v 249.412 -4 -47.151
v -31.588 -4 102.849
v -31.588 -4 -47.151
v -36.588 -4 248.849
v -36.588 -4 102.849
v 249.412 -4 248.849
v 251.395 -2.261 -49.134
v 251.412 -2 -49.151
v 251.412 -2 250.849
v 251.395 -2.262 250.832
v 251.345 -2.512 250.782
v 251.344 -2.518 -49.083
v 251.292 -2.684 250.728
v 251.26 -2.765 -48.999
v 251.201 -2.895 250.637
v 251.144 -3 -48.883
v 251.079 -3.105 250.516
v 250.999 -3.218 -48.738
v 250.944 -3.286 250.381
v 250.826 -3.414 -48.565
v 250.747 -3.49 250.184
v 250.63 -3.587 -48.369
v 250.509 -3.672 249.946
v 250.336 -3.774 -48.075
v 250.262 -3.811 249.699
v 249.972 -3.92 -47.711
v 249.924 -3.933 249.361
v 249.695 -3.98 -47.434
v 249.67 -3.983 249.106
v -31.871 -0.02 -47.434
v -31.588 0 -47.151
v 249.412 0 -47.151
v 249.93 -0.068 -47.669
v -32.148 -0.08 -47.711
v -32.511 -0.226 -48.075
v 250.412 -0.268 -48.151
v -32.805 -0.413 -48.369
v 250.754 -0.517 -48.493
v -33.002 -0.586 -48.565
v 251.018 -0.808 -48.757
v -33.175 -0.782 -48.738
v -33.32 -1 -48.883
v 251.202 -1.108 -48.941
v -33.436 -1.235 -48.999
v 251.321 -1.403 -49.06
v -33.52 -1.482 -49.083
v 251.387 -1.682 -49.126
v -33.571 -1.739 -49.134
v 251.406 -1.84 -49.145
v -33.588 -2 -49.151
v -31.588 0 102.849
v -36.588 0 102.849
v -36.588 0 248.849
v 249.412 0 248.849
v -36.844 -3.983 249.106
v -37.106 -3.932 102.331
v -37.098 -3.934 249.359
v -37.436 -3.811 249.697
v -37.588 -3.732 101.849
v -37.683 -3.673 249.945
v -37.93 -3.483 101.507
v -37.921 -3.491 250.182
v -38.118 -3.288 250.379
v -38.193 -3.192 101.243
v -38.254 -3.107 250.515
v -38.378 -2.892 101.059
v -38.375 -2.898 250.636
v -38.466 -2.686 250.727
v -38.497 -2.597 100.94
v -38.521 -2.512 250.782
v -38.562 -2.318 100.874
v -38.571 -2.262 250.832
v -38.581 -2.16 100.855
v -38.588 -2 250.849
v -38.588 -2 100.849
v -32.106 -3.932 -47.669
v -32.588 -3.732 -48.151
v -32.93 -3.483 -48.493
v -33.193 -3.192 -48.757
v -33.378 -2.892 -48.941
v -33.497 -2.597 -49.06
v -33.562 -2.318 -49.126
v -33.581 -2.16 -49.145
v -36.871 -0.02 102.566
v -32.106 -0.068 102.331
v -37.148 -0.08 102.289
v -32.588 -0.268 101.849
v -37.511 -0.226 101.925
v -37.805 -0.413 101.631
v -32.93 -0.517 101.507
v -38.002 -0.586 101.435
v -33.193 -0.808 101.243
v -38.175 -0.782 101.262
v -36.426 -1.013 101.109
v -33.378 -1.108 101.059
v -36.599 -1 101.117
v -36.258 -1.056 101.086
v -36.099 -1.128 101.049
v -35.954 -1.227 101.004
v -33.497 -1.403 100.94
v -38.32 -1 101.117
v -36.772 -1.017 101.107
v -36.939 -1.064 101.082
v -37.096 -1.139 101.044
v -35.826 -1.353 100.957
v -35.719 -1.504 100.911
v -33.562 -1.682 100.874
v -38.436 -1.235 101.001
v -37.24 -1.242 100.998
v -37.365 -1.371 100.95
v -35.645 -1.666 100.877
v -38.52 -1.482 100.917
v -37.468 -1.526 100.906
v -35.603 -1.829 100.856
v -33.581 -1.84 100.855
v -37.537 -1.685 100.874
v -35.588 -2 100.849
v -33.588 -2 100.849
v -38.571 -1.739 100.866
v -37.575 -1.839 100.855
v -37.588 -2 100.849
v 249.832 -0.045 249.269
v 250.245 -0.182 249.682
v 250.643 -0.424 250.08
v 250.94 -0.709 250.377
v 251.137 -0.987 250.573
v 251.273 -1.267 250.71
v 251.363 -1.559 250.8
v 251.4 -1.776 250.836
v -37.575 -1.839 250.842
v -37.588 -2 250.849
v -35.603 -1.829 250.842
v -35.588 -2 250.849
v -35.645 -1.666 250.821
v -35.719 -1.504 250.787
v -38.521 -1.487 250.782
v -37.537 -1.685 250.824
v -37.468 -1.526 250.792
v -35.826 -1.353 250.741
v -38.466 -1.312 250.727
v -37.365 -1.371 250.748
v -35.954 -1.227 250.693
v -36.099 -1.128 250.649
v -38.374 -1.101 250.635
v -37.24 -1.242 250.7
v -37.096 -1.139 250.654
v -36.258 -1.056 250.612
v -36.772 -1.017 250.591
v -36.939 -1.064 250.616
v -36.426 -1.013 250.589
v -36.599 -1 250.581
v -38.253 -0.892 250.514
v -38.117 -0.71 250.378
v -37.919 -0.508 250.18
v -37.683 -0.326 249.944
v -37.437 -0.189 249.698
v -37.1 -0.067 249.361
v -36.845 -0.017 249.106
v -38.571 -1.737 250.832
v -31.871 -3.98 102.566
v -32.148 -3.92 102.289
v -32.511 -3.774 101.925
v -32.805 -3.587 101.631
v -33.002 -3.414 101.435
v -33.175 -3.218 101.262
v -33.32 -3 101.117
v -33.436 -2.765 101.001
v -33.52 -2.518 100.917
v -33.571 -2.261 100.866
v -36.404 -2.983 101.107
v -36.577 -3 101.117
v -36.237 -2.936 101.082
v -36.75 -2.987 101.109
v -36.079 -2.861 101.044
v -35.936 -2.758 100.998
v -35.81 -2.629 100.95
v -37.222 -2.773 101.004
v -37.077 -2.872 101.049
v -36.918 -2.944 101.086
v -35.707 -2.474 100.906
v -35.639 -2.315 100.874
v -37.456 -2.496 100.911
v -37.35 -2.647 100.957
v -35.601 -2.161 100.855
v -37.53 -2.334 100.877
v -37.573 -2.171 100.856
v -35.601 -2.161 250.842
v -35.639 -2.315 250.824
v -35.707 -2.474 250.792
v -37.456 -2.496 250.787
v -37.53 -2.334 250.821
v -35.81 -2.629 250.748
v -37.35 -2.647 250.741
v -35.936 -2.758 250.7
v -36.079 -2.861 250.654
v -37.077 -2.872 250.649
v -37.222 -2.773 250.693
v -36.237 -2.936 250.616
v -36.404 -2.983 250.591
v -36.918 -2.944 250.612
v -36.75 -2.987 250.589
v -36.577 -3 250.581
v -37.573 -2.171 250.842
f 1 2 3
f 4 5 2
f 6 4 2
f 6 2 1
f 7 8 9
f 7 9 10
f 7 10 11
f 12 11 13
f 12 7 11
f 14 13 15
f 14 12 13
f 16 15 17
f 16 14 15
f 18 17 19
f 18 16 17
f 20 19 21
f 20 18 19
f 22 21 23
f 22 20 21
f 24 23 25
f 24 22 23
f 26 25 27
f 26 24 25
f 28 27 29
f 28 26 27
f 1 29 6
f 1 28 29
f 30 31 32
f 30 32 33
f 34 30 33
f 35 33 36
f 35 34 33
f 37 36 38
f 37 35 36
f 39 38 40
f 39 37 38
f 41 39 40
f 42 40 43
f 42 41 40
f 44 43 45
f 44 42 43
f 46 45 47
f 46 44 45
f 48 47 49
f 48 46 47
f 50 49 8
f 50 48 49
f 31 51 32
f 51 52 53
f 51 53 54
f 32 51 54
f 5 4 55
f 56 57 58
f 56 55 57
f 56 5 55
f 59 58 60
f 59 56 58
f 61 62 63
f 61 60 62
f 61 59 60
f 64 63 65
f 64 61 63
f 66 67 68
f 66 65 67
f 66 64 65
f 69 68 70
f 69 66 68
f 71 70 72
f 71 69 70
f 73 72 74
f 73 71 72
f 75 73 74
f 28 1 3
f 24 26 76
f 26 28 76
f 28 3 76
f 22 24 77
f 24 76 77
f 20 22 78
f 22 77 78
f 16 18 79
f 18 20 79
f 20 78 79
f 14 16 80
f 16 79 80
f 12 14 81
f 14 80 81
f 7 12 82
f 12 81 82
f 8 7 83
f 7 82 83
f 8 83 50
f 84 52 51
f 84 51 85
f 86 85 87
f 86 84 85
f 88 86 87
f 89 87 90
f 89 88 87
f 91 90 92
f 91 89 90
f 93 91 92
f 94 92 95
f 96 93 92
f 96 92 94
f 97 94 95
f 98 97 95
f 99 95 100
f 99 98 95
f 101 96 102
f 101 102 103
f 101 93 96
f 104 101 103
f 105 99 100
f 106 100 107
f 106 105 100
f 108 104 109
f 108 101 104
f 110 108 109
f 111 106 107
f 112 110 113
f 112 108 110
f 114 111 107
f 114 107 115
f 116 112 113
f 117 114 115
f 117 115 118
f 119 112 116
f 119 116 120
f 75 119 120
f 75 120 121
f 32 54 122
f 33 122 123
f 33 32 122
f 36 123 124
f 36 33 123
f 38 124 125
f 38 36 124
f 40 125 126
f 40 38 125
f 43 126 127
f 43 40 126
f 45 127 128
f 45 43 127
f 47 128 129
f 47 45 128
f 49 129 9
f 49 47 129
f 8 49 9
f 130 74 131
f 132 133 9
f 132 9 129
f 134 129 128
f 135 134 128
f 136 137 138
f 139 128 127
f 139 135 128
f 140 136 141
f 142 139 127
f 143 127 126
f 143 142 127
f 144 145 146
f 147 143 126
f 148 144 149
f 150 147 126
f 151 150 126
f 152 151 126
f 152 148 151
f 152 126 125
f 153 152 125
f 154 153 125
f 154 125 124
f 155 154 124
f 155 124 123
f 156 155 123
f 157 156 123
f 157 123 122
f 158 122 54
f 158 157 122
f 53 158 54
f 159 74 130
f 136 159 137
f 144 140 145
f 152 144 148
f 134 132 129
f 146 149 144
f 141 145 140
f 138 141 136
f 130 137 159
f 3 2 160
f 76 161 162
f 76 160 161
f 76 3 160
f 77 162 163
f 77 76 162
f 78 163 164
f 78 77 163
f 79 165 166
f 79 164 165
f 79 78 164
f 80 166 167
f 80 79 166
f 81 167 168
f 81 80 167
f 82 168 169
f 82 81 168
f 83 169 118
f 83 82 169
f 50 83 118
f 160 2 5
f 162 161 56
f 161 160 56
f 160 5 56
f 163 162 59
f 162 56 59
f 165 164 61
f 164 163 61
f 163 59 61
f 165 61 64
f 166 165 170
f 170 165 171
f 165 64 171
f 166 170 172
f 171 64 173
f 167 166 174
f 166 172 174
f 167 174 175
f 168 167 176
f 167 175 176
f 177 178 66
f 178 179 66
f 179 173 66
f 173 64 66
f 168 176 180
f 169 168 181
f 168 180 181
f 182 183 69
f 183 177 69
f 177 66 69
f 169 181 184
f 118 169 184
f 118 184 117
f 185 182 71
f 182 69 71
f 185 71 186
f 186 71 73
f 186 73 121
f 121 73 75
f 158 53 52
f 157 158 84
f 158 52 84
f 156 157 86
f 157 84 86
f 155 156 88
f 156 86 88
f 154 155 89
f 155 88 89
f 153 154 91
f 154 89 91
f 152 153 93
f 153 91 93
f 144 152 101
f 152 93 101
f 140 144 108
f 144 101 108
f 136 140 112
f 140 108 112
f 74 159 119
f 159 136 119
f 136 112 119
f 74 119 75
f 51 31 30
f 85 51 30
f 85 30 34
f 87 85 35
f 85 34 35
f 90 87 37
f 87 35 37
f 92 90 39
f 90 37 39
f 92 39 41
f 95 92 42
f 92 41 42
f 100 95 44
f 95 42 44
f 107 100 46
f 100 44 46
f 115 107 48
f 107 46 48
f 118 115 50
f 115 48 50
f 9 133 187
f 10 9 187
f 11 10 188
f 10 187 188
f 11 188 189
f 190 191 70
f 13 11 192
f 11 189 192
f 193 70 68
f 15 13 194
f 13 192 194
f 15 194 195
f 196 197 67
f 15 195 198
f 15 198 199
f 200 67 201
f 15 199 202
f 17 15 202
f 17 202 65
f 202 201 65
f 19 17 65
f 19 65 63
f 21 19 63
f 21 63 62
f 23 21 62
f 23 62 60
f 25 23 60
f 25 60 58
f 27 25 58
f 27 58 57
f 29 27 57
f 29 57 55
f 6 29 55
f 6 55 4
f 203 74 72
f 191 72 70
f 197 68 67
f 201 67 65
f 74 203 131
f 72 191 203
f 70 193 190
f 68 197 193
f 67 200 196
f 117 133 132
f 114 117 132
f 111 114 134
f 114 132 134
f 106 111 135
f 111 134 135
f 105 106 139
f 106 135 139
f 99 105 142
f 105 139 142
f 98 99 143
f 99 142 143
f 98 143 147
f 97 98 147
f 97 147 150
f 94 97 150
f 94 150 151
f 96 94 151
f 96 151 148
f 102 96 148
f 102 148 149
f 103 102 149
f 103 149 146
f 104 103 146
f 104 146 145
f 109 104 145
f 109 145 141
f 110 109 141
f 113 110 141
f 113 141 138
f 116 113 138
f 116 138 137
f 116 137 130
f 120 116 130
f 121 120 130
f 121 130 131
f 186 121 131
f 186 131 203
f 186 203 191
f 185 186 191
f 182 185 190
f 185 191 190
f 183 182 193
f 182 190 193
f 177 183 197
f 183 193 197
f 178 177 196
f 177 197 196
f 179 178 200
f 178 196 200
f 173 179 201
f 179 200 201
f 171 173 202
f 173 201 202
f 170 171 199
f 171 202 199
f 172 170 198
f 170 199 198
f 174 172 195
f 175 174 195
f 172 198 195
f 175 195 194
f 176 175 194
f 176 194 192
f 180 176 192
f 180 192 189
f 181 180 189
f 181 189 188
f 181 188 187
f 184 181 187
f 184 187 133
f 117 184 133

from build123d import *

# Parameters (mm, degrees)
F1_DEPTH     = 4
F2_R         = 1
F3_DEPTH     = 310
F4_T1_DEPTH  = 300
F4_T3_DEPTH  = 160
F4_T5_DEPTH  = 10
F4_T7_DEPTH  = 155
F4_T9_DEPTH  = 295
F4_T11_DEPTH = 310
F4_T17_DEPTH = 15
F4_T21_DEPTH = 160
F5_T1_DEPTH  = 300
F5_T3_DEPTH  = 160
F5_T5_DEPTH  = 10
F5_T7_DEPTH  = 155
F5_T9_DEPTH  = 295
F5_T11_DEPTH = 310
F5_T17_DEPTH = 15
F5_T21_DEPTH = 160


# Not quite as in the source:
# - a fillet or chamfer that OpenCascade refuses, or shapes differently, is made with other operations: its cross-section is extruded or revolved along the edge and cut away or added


with BuildPart() as f1:
    # F0 (on Front) → F1 (new body)
    with BuildSketch(Plane.XZ):
        Polygon((251.4121359825, 250.8489221025), (-38.5878640175, 250.8489221025), (-38.5878640175, 100.8489221025), (-33.5878640175, 100.8489221025), (-33.5878640175, -49.1510778975), (251.4121359825, -49.1510778975), align=None)
    extrude(amount=F1_DEPTH)

    # F2 (on face) → F3 (cut)
    with BuildSketch(Plane.XY.offset(250.8489221025)):
        with Locations((-36.5878640175, -2)):
            Circle(F2_R)
    extrude(amount=-F3_DEPTH, mode=Mode.SUBTRACT)

    # F4: fillet of radius 2 on 6 edges, made by hand

    # F4_s2 → F4_t1 (cut)
    with BuildSketch(Plane.YZ.offset(-43.5878640175)):
        with BuildLine():
            ThreePointArc((-2, 250.8489221025), (-3.4142135624, 250.2631356648), (-4, 248.8489221025))
            Line((-4, 248.8489221025), (-4, 250.8489221025))
            Line((-4, 250.8489221025), (-2, 250.8489221025))
        make_face()
    extrude(amount=F4_T1_DEPTH, mode=Mode.SUBTRACT)

    # F4_s4 → F4_t3 (cut)
    with BuildSketch(Plane.XY.offset(95.8489221025)):
        with BuildLine():
            ThreePointArc((-36.5878640175, -4), (-38.0020775799, -3.4142135624), (-38.5878640175, -2))
            Line((-38.5878640175, -2), (-38.5878640175, -4))
            Line((-38.5878640175, -4), (-36.5878640175, -4))
        make_face()
    extrude(amount=F4_T3_DEPTH, mode=Mode.SUBTRACT)

    # F4_s6 → F4_t5 (cut)
    with BuildSketch(Plane.YZ.offset(-43.5878640175)):
        with BuildLine():
            ThreePointArc((-4, 102.8489221025), (-3.4142135624, 101.4347085401), (-2, 100.8489221025))
            Line((-2, 100.8489221025), (-4, 100.8489221025))
            Line((-4, 100.8489221025), (-4, 102.8489221025))
        make_face()
    extrude(amount=F4_T5_DEPTH, mode=Mode.SUBTRACT)

    # F4_s8 → F4_t7 (cut)
    with BuildSketch(Plane.XY.offset(-54.1510778975)):
        with BuildLine():
            ThreePointArc((-31.5878640175, -4), (-33.0020775799, -3.4142135624), (-33.5878640175, -2))
            Line((-33.5878640175, -2), (-33.5878640175, -4))
            Line((-33.5878640175, -4), (-31.5878640175, -4))
        make_face()
    extrude(amount=F4_T7_DEPTH, mode=Mode.SUBTRACT)

    # F4_s10 → F4_t9 (cut)
    with BuildSketch(Plane.YZ.offset(-38.5878640175)):
        with BuildLine():
            ThreePointArc((-4, -47.1510778975), (-3.4142135624, -48.5652914599), (-2, -49.1510778975))
            Line((-2, -49.1510778975), (-4, -49.1510778975))
            Line((-4, -49.1510778975), (-4, -47.1510778975))
        make_face()
    extrude(amount=F4_T9_DEPTH, mode=Mode.SUBTRACT)

    # F4_s12 → F4_t11 (cut)
    with BuildSketch(Plane.XY.offset(-54.1510778975)):
        with BuildLine():
            ThreePointArc((251.4121359825, -2), (250.8263495449, -3.4142135624), (249.4121359825, -4))
            Line((249.4121359825, -4), (251.4121359825, -4))
            Line((251.4121359825, -4), (251.4121359825, -2))
        make_face()
    extrude(amount=F4_T11_DEPTH, mode=Mode.SUBTRACT)


with BuildPart() as f4_tool15:
    # F4_s16 → F4_t17 (new body)
    with BuildSketch(Plane.YZ.offset(-43.5878640175)):
        with BuildLine():
            ThreePointArc((-4, 102.8489221025), (-3.4142135624, 101.4347085401), (-2, 100.8489221025))
            Line((-2, 100.8489221025), (-4, 100.8489221025))
            Line((-4, 100.8489221025), (-4, 102.8489221025))
        make_face()
    extrude(amount=F4_T17_DEPTH)

    split(bisect_by=Plane.YZ.offset(-33.5878640175), keep=Keep.TOP)


with BuildPart() as f4_tool19:
    # F4_s20 → F4_t21 (new body)
    with BuildSketch(Plane.XY.offset(105.8489221025)):
        with BuildLine():
            ThreePointArc((-31.5878640175, -4), (-33.0020775799, -3.4142135624), (-33.5878640175, -2))
            Line((-33.5878640175, -2), (-33.5878640175, -4))
            Line((-33.5878640175, -4), (-31.5878640175, -4))
        make_face()
    extrude(amount=-F4_T21_DEPTH)

    split(bisect_by=Plane.XY.offset(100.8489221025), keep=Keep.TOP)


with BuildPart() as f4_tool15_1:
    add(f4_tool15.part)

    # F4_t23: intersect F4_tool19
    add(f4_tool19.part, mode=Mode.INTERSECT)


with BuildPart() as f1_1:
    add(f1.part)

    # F4_t13: cut F4_tool15
    add(f4_tool15_1.part, mode=Mode.SUBTRACT)

    # F5: fillet of radius 2 on 6 edges, made by hand

    # F5_s2 → F5_t1 (cut)
    with BuildSketch(Plane.YZ.offset(-43.5878640175)):
        with BuildLine():
            ThreePointArc((-2, 250.8489221025), (-0.5857864376, 250.2631356648), (0, 248.8489221025))
            Line((0, 248.8489221025), (0, 250.8489221025))
            Line((0, 250.8489221025), (-2, 250.8489221025))
        make_face()
    extrude(amount=F5_T1_DEPTH, mode=Mode.SUBTRACT)

    # F5_s4 → F5_t3 (cut)
    with BuildSketch(Plane.XY.offset(95.8489221025)):
        with BuildLine():
            ThreePointArc((-36.5878640175, 0), (-38.0020775799, -0.5857864376), (-38.5878640175, -2))
            Line((-38.5878640175, -2), (-38.5878640175, 0))
            Line((-38.5878640175, 0), (-36.5878640175, 0))
        make_face()
    extrude(amount=F5_T3_DEPTH, mode=Mode.SUBTRACT)

    # F5_s6 → F5_t5 (cut)
    with BuildSketch(Plane.YZ.offset(-43.5878640175)):
        with BuildLine():
            ThreePointArc((0, 102.8489221025), (-0.5857864376, 101.4347085401), (-2, 100.8489221025))
            Line((-2, 100.8489221025), (0, 100.8489221025))
            Line((0, 100.8489221025), (0, 102.8489221025))
        make_face()
    extrude(amount=F5_T5_DEPTH, mode=Mode.SUBTRACT)

    # F5_s8 → F5_t7 (cut)
    with BuildSketch(Plane.XY.offset(-54.1510778975)):
        with BuildLine():
            ThreePointArc((-31.5878640175, 0), (-33.0020775799, -0.5857864376), (-33.5878640175, -2))
            Line((-33.5878640175, -2), (-33.5878640175, 0))
            Line((-33.5878640175, 0), (-31.5878640175, 0))
        make_face()
    extrude(amount=F5_T7_DEPTH, mode=Mode.SUBTRACT)

    # F5_s10 → F5_t9 (cut)
    with BuildSketch(Plane.YZ.offset(-38.5878640175)):
        with BuildLine():
            ThreePointArc((0, -47.1510778975), (-0.5857864376, -48.5652914599), (-2, -49.1510778975))
            Line((-2, -49.1510778975), (0, -49.1510778975))
            Line((0, -49.1510778975), (0, -47.1510778975))
        make_face()
    extrude(amount=F5_T9_DEPTH, mode=Mode.SUBTRACT)

    # F5_s12 → F5_t11 (cut)
    with BuildSketch(Plane.XY.offset(-54.1510778975)):
        with BuildLine():
            ThreePointArc((249.4121359825, 0), (250.8263495449, -0.5857864376), (251.4121359825, -2))
            Line((251.4121359825, -2), (251.4121359825, 0))
            Line((251.4121359825, 0), (249.4121359825, 0))
        make_face()
    extrude(amount=F5_T11_DEPTH, mode=Mode.SUBTRACT)


with BuildPart() as f5_tool15:
    # F5_s16 → F5_t17 (new body)
    with BuildSketch(Plane.YZ.offset(-43.5878640175)):
        with BuildLine():
            ThreePointArc((0, 102.8489221025), (-0.5857864376, 101.4347085401), (-2, 100.8489221025))
            Line((-2, 100.8489221025), (0, 100.8489221025))
            Line((0, 100.8489221025), (0, 102.8489221025))
        make_face()
    extrude(amount=F5_T17_DEPTH)

    split(bisect_by=Plane.YZ.offset(-33.5878640175), keep=Keep.TOP)


with BuildPart() as f5_tool19:
    # F5_s20 → F5_t21 (new body)
    with BuildSketch(Plane.XY.offset(105.8489221025)):
        with BuildLine():
            ThreePointArc((-31.5878640175, 0), (-33.0020775799, -0.5857864376), (-33.5878640175, -2))
            Line((-33.5878640175, -2), (-33.5878640175, 0))
            Line((-33.5878640175, 0), (-31.5878640175, 0))
        make_face()
    extrude(amount=-F5_T21_DEPTH)

    split(bisect_by=Plane.XY.offset(100.8489221025), keep=Keep.TOP)


with BuildPart() as f5_tool15_1:
    add(f5_tool15.part)

    # F5_t23: intersect F5_tool19
    add(f5_tool19.part, mode=Mode.INTERSECT)


with BuildPart() as f1_2:
    add(f1_1.part)

    # F5_t13: cut F5_tool15
    add(f5_tool15_1.part, mode=Mode.SUBTRACT)


solid = f1_2.part
